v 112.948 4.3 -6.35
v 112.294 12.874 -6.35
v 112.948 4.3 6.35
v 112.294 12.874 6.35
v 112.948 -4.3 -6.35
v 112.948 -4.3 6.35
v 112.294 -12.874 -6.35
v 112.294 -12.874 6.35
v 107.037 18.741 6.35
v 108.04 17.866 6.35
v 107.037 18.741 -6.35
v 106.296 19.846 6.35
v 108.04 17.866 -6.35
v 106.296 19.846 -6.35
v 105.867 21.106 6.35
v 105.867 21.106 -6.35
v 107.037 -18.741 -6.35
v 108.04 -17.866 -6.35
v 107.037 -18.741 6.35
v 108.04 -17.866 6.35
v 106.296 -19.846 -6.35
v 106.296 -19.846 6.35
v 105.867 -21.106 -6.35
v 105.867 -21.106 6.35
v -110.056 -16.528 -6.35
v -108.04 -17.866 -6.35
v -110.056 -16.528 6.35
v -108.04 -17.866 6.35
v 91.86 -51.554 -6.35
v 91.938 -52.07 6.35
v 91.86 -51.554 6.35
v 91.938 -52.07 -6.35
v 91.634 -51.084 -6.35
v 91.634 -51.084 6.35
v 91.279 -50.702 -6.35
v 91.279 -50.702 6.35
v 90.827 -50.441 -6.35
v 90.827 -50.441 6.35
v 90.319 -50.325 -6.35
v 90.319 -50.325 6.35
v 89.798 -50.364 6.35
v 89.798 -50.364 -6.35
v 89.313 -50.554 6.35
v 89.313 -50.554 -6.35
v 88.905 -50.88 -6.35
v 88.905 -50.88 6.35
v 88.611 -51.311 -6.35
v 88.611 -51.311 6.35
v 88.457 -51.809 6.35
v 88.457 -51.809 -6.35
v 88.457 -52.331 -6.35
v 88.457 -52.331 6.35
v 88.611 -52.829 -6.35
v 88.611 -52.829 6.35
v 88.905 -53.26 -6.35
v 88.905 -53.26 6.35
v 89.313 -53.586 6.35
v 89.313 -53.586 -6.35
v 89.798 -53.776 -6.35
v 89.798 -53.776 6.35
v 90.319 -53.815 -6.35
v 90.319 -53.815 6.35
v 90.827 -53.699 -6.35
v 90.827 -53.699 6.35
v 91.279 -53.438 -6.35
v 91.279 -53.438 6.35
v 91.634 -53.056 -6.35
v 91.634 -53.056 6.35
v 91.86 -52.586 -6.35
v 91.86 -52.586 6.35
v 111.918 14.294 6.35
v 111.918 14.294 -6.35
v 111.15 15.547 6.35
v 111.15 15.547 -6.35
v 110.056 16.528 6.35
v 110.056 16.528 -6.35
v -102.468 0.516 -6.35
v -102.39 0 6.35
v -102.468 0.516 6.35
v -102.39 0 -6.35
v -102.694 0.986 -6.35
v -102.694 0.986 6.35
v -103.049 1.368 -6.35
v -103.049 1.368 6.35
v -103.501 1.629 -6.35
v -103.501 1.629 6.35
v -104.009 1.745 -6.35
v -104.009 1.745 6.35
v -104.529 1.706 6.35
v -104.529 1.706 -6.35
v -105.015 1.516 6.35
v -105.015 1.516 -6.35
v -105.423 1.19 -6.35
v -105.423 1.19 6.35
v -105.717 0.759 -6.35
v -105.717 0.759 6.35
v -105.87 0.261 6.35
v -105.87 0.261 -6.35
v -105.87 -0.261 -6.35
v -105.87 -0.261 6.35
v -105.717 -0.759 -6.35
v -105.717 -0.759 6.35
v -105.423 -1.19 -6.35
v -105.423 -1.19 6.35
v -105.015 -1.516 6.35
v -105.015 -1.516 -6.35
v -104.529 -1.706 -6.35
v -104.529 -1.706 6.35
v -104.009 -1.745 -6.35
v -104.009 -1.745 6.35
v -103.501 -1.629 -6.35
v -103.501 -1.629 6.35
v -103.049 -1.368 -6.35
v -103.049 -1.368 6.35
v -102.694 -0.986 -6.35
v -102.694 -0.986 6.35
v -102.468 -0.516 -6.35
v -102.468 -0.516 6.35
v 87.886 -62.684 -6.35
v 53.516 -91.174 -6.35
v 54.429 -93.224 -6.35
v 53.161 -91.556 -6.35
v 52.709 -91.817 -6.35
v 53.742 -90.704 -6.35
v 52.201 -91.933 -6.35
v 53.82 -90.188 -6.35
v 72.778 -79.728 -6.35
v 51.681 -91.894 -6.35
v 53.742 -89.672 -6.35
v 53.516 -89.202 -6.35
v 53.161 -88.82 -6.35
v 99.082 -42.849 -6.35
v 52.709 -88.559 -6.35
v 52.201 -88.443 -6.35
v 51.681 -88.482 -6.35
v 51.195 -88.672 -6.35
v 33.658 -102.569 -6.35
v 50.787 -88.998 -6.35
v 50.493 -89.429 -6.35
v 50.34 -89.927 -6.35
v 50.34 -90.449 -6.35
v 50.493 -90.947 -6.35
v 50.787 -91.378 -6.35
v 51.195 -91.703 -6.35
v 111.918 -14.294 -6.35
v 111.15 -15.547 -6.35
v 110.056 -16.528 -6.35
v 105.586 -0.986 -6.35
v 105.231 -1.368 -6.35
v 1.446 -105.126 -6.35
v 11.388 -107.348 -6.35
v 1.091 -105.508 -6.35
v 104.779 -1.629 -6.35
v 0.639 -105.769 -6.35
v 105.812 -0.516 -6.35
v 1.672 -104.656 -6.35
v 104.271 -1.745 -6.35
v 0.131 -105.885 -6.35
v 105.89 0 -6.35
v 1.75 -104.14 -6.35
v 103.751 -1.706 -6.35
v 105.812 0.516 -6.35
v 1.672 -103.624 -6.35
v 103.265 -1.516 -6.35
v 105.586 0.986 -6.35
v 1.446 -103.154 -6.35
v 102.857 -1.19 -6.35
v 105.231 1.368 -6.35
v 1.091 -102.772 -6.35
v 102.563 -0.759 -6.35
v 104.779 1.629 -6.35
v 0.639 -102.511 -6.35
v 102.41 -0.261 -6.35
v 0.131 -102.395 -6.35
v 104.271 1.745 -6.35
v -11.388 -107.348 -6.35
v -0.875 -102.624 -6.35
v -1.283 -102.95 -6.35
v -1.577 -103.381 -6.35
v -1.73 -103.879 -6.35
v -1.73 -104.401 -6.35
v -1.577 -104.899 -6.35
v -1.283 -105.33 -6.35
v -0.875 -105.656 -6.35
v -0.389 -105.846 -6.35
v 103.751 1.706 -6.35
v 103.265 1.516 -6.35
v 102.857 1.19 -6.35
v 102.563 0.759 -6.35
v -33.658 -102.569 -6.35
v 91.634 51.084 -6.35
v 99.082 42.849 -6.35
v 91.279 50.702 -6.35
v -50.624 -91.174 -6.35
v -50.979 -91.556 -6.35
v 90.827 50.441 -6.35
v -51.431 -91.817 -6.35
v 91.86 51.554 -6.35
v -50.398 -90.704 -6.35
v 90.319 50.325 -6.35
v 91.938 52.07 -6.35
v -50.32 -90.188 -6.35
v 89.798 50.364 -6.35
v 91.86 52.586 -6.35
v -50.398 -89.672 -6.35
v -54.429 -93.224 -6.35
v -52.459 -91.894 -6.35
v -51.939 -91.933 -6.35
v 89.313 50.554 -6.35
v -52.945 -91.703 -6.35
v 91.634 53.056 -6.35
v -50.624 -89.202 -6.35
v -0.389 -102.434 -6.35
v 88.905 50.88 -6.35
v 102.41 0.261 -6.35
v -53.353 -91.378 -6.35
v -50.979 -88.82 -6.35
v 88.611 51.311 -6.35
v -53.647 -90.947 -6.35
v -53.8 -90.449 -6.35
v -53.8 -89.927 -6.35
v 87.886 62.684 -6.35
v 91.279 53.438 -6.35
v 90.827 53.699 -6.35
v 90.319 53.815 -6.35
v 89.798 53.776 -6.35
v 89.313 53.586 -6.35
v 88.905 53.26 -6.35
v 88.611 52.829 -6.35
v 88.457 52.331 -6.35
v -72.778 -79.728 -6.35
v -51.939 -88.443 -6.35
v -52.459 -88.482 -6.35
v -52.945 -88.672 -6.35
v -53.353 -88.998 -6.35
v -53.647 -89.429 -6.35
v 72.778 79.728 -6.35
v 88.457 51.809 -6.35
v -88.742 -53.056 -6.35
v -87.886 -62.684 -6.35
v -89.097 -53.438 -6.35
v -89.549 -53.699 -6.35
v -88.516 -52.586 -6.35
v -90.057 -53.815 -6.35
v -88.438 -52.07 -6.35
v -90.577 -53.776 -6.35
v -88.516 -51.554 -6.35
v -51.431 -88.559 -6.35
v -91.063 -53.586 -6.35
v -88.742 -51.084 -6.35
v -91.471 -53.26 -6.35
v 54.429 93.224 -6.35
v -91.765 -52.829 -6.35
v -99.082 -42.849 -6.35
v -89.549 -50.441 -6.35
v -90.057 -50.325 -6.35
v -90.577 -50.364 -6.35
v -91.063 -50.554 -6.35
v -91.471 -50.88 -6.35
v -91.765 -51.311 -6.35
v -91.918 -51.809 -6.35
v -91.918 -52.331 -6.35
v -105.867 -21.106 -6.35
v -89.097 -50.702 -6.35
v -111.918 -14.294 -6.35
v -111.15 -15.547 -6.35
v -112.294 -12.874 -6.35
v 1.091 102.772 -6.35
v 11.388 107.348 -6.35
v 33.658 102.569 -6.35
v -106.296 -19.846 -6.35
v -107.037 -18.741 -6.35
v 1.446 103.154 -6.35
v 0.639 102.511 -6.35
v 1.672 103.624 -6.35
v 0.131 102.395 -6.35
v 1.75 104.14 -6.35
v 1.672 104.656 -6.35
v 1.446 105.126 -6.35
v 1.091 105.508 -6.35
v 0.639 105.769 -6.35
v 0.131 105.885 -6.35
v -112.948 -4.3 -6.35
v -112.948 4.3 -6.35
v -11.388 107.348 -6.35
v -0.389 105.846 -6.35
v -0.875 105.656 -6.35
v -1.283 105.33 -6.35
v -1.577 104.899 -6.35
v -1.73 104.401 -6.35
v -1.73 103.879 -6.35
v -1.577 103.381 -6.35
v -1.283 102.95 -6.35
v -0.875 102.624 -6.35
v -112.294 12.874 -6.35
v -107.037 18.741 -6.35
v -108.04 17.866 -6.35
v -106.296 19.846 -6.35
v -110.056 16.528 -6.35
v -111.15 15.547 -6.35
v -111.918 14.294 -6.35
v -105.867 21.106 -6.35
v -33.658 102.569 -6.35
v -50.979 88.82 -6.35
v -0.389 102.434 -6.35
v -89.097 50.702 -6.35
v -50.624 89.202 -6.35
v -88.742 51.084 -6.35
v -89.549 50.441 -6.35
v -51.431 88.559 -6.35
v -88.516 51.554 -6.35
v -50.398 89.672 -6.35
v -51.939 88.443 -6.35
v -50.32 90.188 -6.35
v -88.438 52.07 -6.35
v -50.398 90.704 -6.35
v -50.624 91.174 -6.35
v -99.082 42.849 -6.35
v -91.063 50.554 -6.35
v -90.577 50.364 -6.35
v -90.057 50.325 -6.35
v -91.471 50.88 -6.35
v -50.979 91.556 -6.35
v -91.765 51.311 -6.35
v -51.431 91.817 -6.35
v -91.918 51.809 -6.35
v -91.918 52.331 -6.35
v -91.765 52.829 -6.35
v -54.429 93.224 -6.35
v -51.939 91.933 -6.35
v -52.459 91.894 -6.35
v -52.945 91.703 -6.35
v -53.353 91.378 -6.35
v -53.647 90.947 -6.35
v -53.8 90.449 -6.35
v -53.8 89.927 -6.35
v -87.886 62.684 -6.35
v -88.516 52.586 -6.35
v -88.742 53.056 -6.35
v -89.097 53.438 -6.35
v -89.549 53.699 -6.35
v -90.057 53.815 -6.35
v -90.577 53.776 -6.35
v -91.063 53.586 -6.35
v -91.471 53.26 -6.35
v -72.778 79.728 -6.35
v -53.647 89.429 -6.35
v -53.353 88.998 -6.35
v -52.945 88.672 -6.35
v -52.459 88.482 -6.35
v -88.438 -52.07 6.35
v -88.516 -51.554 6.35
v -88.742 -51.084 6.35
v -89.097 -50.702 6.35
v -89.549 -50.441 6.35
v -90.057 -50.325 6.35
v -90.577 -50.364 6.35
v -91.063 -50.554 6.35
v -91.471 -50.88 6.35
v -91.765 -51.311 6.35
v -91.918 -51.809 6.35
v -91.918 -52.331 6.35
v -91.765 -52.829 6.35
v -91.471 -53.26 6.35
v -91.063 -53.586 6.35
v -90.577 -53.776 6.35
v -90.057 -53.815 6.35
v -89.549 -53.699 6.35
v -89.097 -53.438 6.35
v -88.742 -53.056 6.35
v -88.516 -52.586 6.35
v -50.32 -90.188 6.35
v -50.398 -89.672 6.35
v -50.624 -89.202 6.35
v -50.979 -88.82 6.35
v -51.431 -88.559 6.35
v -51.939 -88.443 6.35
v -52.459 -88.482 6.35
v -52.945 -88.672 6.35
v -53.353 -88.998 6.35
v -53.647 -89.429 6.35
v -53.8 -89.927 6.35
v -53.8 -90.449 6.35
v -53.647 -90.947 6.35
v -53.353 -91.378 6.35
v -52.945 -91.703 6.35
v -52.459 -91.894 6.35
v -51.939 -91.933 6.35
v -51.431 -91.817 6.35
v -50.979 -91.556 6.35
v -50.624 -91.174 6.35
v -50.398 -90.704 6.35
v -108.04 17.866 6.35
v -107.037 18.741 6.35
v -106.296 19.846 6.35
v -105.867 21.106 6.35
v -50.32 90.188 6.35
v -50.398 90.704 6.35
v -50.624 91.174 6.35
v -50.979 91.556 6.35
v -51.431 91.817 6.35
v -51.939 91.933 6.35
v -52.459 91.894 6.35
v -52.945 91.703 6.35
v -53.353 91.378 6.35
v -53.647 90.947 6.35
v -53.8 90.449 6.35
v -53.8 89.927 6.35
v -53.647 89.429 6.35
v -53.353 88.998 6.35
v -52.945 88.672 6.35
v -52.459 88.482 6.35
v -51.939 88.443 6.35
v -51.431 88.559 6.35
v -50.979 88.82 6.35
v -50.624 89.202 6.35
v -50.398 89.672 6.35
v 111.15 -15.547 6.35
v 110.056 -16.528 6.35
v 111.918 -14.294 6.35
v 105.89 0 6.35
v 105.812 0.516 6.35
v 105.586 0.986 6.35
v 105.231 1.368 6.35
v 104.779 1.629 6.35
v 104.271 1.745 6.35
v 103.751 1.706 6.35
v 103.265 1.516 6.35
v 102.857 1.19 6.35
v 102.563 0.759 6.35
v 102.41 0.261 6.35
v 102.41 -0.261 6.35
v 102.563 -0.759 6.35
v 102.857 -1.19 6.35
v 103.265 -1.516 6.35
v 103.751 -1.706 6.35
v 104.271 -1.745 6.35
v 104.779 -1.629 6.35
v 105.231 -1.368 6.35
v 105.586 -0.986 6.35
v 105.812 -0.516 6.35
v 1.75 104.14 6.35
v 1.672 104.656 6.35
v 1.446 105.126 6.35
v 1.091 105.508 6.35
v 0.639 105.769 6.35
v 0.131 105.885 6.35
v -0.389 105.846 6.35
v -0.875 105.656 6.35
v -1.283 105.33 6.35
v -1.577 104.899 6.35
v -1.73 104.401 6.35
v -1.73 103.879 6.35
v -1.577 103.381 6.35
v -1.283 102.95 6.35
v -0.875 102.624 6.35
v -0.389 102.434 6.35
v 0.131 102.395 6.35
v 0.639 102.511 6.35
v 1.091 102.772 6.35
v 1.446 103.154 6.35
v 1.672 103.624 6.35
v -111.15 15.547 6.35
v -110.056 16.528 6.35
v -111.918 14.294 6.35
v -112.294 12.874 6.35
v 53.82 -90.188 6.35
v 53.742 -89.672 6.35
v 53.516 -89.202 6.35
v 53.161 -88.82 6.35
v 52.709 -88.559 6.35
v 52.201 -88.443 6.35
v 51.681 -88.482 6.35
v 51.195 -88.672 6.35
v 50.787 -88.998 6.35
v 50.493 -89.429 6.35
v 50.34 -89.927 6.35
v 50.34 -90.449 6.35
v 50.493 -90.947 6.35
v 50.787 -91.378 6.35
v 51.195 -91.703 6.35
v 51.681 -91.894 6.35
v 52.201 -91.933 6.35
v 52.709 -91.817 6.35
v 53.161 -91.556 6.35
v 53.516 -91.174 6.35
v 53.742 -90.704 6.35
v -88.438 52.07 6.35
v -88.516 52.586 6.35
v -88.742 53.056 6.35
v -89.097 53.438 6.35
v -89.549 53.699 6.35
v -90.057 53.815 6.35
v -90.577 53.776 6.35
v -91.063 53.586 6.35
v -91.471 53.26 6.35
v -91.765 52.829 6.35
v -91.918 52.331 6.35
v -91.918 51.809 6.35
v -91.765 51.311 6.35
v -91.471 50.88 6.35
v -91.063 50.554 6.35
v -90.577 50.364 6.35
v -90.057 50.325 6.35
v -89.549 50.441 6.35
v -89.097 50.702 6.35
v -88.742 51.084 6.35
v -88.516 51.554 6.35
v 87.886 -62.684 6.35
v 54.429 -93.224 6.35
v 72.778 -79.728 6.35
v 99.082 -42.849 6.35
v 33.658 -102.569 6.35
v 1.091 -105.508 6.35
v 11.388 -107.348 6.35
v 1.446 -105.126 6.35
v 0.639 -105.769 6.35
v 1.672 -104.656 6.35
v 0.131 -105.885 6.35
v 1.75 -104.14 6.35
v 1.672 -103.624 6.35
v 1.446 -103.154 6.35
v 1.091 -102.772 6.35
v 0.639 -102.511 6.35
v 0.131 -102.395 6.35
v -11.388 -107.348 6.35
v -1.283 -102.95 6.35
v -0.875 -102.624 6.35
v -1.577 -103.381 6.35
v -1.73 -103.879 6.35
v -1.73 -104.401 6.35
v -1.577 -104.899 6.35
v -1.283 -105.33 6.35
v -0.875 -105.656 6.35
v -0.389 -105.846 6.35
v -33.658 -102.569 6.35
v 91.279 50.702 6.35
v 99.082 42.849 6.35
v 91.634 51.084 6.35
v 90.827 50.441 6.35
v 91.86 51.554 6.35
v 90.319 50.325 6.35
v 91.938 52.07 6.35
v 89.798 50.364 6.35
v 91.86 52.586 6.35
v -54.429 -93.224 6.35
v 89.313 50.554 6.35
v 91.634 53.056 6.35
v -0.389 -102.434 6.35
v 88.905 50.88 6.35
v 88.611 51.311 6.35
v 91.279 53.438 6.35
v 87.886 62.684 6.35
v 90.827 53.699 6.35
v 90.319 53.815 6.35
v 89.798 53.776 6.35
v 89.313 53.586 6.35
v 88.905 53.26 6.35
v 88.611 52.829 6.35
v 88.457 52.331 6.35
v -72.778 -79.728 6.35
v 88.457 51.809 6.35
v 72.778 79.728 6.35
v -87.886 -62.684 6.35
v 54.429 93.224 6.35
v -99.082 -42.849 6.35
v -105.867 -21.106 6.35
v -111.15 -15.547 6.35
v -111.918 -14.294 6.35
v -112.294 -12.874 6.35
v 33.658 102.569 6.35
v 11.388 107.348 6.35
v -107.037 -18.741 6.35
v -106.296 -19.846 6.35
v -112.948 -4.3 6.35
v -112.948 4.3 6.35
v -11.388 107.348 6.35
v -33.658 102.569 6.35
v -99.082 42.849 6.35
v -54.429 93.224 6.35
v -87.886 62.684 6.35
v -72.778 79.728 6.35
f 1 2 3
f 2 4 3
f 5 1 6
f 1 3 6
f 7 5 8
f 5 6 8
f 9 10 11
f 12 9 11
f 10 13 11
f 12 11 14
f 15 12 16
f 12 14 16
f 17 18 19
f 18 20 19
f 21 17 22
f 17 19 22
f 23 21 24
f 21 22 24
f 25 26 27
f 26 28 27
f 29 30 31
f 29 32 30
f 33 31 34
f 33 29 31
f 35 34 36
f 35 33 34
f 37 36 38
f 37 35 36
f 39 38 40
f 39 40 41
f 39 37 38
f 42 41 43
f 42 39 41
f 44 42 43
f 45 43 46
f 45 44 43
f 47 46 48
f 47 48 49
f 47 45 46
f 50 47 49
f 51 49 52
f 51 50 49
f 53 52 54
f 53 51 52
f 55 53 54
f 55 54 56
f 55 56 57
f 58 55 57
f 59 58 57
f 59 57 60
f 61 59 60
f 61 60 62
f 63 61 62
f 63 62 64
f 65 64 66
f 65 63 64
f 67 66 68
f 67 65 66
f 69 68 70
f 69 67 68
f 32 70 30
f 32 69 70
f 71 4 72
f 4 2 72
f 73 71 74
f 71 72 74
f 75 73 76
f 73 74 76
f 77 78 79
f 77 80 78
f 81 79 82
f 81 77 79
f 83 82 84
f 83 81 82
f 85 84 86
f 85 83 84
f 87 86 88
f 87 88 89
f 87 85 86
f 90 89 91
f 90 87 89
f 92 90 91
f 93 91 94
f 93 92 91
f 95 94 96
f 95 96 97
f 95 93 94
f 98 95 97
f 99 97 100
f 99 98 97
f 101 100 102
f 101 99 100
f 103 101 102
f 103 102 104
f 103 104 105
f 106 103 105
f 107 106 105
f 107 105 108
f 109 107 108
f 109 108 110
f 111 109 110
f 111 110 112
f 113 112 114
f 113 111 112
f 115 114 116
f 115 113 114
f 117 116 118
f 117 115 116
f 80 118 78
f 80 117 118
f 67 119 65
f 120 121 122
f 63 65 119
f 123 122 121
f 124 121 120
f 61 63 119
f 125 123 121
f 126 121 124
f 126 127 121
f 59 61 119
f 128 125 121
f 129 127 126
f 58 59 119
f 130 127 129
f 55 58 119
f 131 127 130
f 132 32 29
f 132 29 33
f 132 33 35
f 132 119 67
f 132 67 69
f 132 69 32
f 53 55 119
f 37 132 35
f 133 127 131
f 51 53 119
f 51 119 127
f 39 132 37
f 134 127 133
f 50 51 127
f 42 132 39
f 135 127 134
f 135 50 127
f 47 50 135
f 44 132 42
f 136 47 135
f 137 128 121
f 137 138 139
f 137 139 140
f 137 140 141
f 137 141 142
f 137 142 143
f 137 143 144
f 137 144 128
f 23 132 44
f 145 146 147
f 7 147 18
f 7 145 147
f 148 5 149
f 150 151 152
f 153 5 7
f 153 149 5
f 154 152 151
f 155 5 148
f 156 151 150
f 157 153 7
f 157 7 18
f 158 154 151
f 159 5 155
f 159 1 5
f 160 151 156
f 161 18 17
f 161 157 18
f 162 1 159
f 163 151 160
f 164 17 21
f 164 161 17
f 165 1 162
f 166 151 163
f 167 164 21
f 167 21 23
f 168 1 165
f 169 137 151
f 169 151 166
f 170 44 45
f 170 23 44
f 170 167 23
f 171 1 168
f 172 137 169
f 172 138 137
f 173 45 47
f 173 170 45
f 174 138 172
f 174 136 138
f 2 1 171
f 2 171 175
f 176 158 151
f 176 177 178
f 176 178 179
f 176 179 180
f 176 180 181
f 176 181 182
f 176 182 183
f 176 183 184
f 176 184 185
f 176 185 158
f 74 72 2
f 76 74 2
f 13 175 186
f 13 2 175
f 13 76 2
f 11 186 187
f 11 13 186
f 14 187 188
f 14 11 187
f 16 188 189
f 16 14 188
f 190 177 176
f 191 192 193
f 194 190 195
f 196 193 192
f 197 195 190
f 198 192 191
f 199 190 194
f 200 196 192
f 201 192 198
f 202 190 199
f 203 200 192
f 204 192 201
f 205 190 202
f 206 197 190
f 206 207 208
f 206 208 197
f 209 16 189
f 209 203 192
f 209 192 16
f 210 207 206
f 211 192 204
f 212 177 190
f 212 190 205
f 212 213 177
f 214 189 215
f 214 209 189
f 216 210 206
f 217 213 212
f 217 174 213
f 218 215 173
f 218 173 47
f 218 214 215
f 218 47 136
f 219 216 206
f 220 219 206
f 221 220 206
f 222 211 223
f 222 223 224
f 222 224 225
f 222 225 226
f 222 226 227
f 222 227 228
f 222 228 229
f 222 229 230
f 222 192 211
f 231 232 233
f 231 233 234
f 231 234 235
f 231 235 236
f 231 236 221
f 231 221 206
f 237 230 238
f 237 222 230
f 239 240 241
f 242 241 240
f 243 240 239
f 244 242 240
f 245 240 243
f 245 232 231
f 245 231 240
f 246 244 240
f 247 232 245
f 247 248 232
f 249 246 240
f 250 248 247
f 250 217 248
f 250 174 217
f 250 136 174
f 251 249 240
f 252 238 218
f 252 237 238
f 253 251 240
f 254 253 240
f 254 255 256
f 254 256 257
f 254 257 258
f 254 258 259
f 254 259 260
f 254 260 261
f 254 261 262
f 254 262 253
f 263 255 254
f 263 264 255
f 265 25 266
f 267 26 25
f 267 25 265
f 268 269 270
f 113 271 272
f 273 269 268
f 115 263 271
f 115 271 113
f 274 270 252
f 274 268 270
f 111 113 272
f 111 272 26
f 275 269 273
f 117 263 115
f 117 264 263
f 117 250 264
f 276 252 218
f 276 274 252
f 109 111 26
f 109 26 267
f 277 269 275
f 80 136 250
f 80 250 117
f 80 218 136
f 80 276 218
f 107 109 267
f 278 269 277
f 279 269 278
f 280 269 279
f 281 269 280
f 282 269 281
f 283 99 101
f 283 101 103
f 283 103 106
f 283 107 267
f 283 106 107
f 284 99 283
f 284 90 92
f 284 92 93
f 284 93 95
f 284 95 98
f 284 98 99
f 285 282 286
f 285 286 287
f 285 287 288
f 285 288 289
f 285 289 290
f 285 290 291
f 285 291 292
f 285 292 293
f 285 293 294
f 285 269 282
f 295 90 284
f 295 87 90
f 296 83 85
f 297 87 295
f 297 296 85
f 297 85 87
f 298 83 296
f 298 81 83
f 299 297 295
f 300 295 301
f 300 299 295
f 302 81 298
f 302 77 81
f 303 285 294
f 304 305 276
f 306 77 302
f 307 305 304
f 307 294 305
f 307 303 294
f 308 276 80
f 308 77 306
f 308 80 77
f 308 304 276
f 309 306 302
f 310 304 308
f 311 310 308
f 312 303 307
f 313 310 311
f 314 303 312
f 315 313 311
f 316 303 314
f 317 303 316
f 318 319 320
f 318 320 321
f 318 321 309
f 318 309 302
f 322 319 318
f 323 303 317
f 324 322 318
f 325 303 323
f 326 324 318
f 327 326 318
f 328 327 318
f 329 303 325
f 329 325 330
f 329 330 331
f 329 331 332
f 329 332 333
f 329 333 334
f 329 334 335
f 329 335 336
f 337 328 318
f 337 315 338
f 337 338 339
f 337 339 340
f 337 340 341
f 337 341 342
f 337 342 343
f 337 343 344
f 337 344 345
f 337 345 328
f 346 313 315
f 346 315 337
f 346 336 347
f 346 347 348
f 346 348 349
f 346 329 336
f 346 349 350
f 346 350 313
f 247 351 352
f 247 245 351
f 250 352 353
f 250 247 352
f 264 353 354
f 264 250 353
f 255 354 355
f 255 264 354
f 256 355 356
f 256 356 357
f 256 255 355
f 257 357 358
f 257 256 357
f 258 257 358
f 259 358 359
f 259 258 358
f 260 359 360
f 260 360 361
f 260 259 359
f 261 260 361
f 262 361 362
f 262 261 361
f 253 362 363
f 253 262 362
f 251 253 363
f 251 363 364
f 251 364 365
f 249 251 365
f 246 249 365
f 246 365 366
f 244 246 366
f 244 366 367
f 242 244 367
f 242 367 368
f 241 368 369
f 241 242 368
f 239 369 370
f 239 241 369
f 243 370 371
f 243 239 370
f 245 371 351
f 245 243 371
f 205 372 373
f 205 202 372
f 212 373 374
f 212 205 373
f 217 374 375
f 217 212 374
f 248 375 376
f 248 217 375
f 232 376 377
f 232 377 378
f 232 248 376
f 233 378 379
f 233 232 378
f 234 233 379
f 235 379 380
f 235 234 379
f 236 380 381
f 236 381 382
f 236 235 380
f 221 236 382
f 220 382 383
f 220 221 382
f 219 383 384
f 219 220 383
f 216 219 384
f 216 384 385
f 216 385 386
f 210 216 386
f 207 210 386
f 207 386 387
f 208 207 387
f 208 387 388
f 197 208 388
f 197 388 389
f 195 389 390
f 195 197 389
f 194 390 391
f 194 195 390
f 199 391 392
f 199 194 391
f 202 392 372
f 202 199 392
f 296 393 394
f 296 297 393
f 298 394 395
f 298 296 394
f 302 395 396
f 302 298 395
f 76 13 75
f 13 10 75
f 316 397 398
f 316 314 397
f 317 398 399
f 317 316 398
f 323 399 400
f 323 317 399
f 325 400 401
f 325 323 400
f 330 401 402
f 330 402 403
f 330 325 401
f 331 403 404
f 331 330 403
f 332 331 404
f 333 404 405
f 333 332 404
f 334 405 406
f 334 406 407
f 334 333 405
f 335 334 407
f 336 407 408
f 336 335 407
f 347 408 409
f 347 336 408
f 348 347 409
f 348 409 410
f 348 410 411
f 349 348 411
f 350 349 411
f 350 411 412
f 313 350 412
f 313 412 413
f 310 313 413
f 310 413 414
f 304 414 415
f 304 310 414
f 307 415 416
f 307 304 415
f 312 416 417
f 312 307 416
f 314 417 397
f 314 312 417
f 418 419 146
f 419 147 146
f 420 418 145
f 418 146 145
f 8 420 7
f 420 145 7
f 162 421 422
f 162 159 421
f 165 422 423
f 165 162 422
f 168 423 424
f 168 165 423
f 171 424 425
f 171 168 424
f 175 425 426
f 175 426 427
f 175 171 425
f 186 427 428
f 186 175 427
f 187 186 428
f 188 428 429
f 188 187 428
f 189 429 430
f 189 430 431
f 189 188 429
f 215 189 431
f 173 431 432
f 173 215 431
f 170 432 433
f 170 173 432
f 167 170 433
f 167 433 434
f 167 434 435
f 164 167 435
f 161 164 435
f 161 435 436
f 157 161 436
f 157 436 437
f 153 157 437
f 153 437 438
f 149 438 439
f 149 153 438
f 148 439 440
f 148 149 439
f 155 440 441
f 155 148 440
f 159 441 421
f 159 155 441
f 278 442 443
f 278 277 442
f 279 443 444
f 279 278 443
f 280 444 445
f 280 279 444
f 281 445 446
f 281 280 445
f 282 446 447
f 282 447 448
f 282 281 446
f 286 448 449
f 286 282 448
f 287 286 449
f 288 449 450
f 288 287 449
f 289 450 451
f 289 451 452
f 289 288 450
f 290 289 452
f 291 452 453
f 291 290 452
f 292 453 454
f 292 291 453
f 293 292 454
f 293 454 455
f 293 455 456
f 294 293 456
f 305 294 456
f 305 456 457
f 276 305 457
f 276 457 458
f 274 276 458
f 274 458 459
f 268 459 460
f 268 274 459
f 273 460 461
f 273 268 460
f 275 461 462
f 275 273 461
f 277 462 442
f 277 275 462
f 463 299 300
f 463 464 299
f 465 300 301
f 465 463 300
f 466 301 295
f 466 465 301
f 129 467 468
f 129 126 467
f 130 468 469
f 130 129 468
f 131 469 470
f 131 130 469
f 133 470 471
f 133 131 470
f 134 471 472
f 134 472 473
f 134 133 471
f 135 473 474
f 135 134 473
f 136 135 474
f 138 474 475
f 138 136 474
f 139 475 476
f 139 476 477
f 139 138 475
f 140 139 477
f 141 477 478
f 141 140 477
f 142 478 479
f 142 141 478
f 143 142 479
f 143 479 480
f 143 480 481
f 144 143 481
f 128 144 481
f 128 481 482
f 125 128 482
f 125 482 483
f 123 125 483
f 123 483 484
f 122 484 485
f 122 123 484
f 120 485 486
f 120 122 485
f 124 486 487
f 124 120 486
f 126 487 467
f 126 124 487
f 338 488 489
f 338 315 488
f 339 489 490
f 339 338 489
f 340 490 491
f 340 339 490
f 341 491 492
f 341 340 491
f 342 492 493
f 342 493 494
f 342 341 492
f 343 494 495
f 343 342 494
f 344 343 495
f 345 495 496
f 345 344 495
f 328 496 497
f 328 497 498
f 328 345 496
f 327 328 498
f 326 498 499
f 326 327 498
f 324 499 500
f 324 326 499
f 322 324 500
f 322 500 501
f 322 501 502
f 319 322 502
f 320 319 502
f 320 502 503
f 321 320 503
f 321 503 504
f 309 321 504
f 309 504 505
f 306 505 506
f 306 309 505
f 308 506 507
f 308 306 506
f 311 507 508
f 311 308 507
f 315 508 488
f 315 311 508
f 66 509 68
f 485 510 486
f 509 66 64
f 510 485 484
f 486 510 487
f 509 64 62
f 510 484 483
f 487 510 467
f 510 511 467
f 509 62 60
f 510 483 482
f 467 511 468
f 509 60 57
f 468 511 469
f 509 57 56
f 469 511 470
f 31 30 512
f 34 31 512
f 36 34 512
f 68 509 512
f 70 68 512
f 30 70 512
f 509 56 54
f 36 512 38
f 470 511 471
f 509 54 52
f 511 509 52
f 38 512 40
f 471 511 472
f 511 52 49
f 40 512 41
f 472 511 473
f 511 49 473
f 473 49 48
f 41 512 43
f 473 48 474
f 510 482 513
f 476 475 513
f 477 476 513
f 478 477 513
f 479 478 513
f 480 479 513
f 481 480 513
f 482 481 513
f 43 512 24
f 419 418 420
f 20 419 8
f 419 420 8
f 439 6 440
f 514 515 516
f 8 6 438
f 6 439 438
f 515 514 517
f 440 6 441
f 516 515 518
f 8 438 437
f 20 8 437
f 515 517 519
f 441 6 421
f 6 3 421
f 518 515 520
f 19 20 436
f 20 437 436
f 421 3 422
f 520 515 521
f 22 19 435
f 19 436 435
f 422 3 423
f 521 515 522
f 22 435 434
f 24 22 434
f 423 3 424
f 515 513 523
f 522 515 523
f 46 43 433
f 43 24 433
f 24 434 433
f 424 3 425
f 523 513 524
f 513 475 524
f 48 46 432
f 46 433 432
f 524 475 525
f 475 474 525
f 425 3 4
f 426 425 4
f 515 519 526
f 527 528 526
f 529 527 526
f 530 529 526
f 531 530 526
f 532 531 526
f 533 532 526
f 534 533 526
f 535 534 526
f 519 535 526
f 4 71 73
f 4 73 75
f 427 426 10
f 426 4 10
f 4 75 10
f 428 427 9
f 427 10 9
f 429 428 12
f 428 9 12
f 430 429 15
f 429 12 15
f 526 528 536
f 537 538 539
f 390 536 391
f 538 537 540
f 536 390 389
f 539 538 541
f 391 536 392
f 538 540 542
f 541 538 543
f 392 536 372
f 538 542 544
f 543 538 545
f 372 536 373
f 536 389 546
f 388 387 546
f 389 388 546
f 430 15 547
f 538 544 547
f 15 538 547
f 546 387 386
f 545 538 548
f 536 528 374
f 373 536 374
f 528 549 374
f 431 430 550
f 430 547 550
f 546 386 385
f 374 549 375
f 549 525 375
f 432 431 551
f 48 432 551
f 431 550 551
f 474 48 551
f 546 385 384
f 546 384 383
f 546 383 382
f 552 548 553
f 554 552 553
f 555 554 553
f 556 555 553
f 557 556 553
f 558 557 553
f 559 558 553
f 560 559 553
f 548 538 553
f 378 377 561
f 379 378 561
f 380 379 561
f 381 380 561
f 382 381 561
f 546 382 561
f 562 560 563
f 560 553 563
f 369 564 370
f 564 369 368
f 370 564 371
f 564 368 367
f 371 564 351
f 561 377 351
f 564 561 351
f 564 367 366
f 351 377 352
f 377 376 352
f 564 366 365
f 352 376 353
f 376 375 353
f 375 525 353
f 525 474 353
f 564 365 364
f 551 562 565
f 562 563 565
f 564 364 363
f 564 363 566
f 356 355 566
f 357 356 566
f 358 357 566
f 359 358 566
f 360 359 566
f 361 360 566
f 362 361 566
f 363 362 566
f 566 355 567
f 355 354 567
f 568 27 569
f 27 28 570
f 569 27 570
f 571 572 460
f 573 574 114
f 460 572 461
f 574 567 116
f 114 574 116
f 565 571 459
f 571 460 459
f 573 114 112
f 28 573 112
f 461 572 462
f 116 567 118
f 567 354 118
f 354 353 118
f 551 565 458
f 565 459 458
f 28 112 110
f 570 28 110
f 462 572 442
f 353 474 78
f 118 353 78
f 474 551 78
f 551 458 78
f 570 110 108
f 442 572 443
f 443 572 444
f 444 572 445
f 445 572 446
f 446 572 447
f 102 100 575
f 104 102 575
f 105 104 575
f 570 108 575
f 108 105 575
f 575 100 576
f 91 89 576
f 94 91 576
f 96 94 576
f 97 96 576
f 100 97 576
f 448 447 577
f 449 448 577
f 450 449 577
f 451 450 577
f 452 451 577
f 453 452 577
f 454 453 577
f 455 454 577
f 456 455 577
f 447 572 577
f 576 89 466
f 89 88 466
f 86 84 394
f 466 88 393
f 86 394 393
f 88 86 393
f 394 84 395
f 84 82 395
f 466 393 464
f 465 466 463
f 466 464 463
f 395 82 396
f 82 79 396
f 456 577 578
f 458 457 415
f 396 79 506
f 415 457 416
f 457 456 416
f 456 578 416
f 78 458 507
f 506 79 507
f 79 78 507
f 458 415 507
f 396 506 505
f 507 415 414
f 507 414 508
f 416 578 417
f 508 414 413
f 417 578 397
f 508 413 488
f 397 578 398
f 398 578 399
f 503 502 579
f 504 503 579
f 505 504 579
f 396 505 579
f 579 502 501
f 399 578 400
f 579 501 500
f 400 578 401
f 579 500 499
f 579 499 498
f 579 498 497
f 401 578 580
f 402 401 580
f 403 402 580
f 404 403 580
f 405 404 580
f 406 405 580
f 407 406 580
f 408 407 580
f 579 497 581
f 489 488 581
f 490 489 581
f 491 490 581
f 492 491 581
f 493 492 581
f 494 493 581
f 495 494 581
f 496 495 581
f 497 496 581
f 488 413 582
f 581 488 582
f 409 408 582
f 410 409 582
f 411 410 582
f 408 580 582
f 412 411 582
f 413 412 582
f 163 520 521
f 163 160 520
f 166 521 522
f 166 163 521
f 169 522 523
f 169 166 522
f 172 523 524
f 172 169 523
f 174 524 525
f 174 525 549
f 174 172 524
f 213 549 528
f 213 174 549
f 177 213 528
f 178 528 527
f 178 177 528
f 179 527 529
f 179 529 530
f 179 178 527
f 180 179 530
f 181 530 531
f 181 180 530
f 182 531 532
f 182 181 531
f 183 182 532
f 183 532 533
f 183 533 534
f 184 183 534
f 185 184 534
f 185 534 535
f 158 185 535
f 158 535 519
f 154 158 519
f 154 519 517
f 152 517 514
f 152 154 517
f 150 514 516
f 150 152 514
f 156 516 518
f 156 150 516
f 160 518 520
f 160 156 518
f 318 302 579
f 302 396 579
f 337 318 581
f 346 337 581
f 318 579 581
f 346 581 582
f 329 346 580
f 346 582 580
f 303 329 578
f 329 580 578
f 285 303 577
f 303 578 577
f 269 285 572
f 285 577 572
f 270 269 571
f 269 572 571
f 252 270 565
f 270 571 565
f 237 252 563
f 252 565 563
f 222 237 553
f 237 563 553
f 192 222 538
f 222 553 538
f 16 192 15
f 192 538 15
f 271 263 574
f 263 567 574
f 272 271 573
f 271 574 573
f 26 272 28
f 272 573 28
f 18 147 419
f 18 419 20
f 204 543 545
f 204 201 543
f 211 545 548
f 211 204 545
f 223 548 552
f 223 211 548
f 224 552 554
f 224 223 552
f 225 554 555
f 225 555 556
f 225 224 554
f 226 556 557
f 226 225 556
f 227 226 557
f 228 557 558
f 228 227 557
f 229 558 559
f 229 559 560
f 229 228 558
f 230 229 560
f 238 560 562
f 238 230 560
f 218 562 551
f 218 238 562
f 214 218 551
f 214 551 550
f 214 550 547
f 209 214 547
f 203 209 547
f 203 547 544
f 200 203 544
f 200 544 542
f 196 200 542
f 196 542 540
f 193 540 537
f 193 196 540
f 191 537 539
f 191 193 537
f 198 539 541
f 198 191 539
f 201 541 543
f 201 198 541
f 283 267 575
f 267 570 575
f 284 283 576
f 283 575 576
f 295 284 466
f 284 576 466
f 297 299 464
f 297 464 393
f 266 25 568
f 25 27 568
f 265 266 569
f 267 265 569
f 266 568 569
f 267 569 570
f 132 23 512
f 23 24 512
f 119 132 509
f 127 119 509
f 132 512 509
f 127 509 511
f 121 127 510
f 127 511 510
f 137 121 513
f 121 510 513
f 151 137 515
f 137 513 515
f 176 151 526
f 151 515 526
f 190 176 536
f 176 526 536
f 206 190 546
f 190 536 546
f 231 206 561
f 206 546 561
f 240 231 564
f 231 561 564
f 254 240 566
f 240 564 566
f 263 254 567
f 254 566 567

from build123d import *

# Parameters (mm, degrees)
SKETCH1_R           = 1.75
BOSS_EXTRUDE1_DEPTH = 6.35
FILLET1_R           = 5.08


with BuildPart() as part:
    # Sketch1 → Boss-Extrude1 (new, symmetric)
    with BuildSketch(Plane.XY):
        with BuildLine():
            Line((-111.997871855, 15.24), (-106.25582337, 19.05))
            ThreePointArc((-106.25582337, 19.05), (0, 107.95), (106.25582337, 19.05))
            Line((106.25582337, 19.05), (111.997871855, 15.24))
            ThreePointArc((111.997871855, 15.24), (113.03, 0), (111.997871855, -15.24))
            Line((111.997871855, -15.24), (106.25582337, -19.05))
            ThreePointArc((106.25582337, -19.05), (0, -107.95), (-106.25582337, -19.05))
            Line((-106.25582337, -19.05), (-111.997871855, -15.24))
            ThreePointArc((-111.997871855, -15.24), (-113.03, 0), (-111.997871855, 15.24))
        make_face()
        with Locations((0, 104.14)):
            Circle(SKETCH1_R, mode=Mode.SUBTRACT)
        with Locations((90.18788555, 52.07)):
            Circle(SKETCH1_R, mode=Mode.SUBTRACT)
        with Locations((104.14, 0)):
            Circle(SKETCH1_R, mode=Mode.SUBTRACT)
        with Locations((90.18788555, -52.07)):
            Circle(SKETCH1_R, mode=Mode.SUBTRACT)
        with Locations((52.07, -90.18788555)):
            Circle(SKETCH1_R, mode=Mode.SUBTRACT)
        with Locations((0, -104.14)):
            Circle(SKETCH1_R, mode=Mode.SUBTRACT)
        with Locations((-52.07, -90.18788555)):
            Circle(SKETCH1_R, mode=Mode.SUBTRACT)
        with Locations((-90.18788555, -52.07)):
            Circle(SKETCH1_R, mode=Mode.SUBTRACT)
        with Locations((-104.14, 0)):
            Circle(SKETCH1_R, mode=Mode.SUBTRACT)
        with Locations((-90.18788555, 52.07)):
            Circle(SKETCH1_R, mode=Mode.SUBTRACT)
        with Locations((-52.07, 90.18788555)):
            Circle(SKETCH1_R, mode=Mode.SUBTRACT)
    extrude(amount=BOSS_EXTRUDE1_DEPTH, both=True)

    # Fillet1
    fillet1_edges = [part.edges().sort_by_distance(p)[0] for p in [
        (-111.997871855, -15.24, 0),
        (-111.997871855, 15.24, 0),
        (-106.25582337, 19.05, 0),
        (106.25582337, 19.05, 0),
        (111.997871855, 15.24, 0),
        (111.997871855, -15.24, 0),
        (106.25582337, -19.05, 0),
        (-106.25582337, -19.05, 0),
    ]]
    fillet(fillet1_edges, radius=FILLET1_R)


solid = part.part
